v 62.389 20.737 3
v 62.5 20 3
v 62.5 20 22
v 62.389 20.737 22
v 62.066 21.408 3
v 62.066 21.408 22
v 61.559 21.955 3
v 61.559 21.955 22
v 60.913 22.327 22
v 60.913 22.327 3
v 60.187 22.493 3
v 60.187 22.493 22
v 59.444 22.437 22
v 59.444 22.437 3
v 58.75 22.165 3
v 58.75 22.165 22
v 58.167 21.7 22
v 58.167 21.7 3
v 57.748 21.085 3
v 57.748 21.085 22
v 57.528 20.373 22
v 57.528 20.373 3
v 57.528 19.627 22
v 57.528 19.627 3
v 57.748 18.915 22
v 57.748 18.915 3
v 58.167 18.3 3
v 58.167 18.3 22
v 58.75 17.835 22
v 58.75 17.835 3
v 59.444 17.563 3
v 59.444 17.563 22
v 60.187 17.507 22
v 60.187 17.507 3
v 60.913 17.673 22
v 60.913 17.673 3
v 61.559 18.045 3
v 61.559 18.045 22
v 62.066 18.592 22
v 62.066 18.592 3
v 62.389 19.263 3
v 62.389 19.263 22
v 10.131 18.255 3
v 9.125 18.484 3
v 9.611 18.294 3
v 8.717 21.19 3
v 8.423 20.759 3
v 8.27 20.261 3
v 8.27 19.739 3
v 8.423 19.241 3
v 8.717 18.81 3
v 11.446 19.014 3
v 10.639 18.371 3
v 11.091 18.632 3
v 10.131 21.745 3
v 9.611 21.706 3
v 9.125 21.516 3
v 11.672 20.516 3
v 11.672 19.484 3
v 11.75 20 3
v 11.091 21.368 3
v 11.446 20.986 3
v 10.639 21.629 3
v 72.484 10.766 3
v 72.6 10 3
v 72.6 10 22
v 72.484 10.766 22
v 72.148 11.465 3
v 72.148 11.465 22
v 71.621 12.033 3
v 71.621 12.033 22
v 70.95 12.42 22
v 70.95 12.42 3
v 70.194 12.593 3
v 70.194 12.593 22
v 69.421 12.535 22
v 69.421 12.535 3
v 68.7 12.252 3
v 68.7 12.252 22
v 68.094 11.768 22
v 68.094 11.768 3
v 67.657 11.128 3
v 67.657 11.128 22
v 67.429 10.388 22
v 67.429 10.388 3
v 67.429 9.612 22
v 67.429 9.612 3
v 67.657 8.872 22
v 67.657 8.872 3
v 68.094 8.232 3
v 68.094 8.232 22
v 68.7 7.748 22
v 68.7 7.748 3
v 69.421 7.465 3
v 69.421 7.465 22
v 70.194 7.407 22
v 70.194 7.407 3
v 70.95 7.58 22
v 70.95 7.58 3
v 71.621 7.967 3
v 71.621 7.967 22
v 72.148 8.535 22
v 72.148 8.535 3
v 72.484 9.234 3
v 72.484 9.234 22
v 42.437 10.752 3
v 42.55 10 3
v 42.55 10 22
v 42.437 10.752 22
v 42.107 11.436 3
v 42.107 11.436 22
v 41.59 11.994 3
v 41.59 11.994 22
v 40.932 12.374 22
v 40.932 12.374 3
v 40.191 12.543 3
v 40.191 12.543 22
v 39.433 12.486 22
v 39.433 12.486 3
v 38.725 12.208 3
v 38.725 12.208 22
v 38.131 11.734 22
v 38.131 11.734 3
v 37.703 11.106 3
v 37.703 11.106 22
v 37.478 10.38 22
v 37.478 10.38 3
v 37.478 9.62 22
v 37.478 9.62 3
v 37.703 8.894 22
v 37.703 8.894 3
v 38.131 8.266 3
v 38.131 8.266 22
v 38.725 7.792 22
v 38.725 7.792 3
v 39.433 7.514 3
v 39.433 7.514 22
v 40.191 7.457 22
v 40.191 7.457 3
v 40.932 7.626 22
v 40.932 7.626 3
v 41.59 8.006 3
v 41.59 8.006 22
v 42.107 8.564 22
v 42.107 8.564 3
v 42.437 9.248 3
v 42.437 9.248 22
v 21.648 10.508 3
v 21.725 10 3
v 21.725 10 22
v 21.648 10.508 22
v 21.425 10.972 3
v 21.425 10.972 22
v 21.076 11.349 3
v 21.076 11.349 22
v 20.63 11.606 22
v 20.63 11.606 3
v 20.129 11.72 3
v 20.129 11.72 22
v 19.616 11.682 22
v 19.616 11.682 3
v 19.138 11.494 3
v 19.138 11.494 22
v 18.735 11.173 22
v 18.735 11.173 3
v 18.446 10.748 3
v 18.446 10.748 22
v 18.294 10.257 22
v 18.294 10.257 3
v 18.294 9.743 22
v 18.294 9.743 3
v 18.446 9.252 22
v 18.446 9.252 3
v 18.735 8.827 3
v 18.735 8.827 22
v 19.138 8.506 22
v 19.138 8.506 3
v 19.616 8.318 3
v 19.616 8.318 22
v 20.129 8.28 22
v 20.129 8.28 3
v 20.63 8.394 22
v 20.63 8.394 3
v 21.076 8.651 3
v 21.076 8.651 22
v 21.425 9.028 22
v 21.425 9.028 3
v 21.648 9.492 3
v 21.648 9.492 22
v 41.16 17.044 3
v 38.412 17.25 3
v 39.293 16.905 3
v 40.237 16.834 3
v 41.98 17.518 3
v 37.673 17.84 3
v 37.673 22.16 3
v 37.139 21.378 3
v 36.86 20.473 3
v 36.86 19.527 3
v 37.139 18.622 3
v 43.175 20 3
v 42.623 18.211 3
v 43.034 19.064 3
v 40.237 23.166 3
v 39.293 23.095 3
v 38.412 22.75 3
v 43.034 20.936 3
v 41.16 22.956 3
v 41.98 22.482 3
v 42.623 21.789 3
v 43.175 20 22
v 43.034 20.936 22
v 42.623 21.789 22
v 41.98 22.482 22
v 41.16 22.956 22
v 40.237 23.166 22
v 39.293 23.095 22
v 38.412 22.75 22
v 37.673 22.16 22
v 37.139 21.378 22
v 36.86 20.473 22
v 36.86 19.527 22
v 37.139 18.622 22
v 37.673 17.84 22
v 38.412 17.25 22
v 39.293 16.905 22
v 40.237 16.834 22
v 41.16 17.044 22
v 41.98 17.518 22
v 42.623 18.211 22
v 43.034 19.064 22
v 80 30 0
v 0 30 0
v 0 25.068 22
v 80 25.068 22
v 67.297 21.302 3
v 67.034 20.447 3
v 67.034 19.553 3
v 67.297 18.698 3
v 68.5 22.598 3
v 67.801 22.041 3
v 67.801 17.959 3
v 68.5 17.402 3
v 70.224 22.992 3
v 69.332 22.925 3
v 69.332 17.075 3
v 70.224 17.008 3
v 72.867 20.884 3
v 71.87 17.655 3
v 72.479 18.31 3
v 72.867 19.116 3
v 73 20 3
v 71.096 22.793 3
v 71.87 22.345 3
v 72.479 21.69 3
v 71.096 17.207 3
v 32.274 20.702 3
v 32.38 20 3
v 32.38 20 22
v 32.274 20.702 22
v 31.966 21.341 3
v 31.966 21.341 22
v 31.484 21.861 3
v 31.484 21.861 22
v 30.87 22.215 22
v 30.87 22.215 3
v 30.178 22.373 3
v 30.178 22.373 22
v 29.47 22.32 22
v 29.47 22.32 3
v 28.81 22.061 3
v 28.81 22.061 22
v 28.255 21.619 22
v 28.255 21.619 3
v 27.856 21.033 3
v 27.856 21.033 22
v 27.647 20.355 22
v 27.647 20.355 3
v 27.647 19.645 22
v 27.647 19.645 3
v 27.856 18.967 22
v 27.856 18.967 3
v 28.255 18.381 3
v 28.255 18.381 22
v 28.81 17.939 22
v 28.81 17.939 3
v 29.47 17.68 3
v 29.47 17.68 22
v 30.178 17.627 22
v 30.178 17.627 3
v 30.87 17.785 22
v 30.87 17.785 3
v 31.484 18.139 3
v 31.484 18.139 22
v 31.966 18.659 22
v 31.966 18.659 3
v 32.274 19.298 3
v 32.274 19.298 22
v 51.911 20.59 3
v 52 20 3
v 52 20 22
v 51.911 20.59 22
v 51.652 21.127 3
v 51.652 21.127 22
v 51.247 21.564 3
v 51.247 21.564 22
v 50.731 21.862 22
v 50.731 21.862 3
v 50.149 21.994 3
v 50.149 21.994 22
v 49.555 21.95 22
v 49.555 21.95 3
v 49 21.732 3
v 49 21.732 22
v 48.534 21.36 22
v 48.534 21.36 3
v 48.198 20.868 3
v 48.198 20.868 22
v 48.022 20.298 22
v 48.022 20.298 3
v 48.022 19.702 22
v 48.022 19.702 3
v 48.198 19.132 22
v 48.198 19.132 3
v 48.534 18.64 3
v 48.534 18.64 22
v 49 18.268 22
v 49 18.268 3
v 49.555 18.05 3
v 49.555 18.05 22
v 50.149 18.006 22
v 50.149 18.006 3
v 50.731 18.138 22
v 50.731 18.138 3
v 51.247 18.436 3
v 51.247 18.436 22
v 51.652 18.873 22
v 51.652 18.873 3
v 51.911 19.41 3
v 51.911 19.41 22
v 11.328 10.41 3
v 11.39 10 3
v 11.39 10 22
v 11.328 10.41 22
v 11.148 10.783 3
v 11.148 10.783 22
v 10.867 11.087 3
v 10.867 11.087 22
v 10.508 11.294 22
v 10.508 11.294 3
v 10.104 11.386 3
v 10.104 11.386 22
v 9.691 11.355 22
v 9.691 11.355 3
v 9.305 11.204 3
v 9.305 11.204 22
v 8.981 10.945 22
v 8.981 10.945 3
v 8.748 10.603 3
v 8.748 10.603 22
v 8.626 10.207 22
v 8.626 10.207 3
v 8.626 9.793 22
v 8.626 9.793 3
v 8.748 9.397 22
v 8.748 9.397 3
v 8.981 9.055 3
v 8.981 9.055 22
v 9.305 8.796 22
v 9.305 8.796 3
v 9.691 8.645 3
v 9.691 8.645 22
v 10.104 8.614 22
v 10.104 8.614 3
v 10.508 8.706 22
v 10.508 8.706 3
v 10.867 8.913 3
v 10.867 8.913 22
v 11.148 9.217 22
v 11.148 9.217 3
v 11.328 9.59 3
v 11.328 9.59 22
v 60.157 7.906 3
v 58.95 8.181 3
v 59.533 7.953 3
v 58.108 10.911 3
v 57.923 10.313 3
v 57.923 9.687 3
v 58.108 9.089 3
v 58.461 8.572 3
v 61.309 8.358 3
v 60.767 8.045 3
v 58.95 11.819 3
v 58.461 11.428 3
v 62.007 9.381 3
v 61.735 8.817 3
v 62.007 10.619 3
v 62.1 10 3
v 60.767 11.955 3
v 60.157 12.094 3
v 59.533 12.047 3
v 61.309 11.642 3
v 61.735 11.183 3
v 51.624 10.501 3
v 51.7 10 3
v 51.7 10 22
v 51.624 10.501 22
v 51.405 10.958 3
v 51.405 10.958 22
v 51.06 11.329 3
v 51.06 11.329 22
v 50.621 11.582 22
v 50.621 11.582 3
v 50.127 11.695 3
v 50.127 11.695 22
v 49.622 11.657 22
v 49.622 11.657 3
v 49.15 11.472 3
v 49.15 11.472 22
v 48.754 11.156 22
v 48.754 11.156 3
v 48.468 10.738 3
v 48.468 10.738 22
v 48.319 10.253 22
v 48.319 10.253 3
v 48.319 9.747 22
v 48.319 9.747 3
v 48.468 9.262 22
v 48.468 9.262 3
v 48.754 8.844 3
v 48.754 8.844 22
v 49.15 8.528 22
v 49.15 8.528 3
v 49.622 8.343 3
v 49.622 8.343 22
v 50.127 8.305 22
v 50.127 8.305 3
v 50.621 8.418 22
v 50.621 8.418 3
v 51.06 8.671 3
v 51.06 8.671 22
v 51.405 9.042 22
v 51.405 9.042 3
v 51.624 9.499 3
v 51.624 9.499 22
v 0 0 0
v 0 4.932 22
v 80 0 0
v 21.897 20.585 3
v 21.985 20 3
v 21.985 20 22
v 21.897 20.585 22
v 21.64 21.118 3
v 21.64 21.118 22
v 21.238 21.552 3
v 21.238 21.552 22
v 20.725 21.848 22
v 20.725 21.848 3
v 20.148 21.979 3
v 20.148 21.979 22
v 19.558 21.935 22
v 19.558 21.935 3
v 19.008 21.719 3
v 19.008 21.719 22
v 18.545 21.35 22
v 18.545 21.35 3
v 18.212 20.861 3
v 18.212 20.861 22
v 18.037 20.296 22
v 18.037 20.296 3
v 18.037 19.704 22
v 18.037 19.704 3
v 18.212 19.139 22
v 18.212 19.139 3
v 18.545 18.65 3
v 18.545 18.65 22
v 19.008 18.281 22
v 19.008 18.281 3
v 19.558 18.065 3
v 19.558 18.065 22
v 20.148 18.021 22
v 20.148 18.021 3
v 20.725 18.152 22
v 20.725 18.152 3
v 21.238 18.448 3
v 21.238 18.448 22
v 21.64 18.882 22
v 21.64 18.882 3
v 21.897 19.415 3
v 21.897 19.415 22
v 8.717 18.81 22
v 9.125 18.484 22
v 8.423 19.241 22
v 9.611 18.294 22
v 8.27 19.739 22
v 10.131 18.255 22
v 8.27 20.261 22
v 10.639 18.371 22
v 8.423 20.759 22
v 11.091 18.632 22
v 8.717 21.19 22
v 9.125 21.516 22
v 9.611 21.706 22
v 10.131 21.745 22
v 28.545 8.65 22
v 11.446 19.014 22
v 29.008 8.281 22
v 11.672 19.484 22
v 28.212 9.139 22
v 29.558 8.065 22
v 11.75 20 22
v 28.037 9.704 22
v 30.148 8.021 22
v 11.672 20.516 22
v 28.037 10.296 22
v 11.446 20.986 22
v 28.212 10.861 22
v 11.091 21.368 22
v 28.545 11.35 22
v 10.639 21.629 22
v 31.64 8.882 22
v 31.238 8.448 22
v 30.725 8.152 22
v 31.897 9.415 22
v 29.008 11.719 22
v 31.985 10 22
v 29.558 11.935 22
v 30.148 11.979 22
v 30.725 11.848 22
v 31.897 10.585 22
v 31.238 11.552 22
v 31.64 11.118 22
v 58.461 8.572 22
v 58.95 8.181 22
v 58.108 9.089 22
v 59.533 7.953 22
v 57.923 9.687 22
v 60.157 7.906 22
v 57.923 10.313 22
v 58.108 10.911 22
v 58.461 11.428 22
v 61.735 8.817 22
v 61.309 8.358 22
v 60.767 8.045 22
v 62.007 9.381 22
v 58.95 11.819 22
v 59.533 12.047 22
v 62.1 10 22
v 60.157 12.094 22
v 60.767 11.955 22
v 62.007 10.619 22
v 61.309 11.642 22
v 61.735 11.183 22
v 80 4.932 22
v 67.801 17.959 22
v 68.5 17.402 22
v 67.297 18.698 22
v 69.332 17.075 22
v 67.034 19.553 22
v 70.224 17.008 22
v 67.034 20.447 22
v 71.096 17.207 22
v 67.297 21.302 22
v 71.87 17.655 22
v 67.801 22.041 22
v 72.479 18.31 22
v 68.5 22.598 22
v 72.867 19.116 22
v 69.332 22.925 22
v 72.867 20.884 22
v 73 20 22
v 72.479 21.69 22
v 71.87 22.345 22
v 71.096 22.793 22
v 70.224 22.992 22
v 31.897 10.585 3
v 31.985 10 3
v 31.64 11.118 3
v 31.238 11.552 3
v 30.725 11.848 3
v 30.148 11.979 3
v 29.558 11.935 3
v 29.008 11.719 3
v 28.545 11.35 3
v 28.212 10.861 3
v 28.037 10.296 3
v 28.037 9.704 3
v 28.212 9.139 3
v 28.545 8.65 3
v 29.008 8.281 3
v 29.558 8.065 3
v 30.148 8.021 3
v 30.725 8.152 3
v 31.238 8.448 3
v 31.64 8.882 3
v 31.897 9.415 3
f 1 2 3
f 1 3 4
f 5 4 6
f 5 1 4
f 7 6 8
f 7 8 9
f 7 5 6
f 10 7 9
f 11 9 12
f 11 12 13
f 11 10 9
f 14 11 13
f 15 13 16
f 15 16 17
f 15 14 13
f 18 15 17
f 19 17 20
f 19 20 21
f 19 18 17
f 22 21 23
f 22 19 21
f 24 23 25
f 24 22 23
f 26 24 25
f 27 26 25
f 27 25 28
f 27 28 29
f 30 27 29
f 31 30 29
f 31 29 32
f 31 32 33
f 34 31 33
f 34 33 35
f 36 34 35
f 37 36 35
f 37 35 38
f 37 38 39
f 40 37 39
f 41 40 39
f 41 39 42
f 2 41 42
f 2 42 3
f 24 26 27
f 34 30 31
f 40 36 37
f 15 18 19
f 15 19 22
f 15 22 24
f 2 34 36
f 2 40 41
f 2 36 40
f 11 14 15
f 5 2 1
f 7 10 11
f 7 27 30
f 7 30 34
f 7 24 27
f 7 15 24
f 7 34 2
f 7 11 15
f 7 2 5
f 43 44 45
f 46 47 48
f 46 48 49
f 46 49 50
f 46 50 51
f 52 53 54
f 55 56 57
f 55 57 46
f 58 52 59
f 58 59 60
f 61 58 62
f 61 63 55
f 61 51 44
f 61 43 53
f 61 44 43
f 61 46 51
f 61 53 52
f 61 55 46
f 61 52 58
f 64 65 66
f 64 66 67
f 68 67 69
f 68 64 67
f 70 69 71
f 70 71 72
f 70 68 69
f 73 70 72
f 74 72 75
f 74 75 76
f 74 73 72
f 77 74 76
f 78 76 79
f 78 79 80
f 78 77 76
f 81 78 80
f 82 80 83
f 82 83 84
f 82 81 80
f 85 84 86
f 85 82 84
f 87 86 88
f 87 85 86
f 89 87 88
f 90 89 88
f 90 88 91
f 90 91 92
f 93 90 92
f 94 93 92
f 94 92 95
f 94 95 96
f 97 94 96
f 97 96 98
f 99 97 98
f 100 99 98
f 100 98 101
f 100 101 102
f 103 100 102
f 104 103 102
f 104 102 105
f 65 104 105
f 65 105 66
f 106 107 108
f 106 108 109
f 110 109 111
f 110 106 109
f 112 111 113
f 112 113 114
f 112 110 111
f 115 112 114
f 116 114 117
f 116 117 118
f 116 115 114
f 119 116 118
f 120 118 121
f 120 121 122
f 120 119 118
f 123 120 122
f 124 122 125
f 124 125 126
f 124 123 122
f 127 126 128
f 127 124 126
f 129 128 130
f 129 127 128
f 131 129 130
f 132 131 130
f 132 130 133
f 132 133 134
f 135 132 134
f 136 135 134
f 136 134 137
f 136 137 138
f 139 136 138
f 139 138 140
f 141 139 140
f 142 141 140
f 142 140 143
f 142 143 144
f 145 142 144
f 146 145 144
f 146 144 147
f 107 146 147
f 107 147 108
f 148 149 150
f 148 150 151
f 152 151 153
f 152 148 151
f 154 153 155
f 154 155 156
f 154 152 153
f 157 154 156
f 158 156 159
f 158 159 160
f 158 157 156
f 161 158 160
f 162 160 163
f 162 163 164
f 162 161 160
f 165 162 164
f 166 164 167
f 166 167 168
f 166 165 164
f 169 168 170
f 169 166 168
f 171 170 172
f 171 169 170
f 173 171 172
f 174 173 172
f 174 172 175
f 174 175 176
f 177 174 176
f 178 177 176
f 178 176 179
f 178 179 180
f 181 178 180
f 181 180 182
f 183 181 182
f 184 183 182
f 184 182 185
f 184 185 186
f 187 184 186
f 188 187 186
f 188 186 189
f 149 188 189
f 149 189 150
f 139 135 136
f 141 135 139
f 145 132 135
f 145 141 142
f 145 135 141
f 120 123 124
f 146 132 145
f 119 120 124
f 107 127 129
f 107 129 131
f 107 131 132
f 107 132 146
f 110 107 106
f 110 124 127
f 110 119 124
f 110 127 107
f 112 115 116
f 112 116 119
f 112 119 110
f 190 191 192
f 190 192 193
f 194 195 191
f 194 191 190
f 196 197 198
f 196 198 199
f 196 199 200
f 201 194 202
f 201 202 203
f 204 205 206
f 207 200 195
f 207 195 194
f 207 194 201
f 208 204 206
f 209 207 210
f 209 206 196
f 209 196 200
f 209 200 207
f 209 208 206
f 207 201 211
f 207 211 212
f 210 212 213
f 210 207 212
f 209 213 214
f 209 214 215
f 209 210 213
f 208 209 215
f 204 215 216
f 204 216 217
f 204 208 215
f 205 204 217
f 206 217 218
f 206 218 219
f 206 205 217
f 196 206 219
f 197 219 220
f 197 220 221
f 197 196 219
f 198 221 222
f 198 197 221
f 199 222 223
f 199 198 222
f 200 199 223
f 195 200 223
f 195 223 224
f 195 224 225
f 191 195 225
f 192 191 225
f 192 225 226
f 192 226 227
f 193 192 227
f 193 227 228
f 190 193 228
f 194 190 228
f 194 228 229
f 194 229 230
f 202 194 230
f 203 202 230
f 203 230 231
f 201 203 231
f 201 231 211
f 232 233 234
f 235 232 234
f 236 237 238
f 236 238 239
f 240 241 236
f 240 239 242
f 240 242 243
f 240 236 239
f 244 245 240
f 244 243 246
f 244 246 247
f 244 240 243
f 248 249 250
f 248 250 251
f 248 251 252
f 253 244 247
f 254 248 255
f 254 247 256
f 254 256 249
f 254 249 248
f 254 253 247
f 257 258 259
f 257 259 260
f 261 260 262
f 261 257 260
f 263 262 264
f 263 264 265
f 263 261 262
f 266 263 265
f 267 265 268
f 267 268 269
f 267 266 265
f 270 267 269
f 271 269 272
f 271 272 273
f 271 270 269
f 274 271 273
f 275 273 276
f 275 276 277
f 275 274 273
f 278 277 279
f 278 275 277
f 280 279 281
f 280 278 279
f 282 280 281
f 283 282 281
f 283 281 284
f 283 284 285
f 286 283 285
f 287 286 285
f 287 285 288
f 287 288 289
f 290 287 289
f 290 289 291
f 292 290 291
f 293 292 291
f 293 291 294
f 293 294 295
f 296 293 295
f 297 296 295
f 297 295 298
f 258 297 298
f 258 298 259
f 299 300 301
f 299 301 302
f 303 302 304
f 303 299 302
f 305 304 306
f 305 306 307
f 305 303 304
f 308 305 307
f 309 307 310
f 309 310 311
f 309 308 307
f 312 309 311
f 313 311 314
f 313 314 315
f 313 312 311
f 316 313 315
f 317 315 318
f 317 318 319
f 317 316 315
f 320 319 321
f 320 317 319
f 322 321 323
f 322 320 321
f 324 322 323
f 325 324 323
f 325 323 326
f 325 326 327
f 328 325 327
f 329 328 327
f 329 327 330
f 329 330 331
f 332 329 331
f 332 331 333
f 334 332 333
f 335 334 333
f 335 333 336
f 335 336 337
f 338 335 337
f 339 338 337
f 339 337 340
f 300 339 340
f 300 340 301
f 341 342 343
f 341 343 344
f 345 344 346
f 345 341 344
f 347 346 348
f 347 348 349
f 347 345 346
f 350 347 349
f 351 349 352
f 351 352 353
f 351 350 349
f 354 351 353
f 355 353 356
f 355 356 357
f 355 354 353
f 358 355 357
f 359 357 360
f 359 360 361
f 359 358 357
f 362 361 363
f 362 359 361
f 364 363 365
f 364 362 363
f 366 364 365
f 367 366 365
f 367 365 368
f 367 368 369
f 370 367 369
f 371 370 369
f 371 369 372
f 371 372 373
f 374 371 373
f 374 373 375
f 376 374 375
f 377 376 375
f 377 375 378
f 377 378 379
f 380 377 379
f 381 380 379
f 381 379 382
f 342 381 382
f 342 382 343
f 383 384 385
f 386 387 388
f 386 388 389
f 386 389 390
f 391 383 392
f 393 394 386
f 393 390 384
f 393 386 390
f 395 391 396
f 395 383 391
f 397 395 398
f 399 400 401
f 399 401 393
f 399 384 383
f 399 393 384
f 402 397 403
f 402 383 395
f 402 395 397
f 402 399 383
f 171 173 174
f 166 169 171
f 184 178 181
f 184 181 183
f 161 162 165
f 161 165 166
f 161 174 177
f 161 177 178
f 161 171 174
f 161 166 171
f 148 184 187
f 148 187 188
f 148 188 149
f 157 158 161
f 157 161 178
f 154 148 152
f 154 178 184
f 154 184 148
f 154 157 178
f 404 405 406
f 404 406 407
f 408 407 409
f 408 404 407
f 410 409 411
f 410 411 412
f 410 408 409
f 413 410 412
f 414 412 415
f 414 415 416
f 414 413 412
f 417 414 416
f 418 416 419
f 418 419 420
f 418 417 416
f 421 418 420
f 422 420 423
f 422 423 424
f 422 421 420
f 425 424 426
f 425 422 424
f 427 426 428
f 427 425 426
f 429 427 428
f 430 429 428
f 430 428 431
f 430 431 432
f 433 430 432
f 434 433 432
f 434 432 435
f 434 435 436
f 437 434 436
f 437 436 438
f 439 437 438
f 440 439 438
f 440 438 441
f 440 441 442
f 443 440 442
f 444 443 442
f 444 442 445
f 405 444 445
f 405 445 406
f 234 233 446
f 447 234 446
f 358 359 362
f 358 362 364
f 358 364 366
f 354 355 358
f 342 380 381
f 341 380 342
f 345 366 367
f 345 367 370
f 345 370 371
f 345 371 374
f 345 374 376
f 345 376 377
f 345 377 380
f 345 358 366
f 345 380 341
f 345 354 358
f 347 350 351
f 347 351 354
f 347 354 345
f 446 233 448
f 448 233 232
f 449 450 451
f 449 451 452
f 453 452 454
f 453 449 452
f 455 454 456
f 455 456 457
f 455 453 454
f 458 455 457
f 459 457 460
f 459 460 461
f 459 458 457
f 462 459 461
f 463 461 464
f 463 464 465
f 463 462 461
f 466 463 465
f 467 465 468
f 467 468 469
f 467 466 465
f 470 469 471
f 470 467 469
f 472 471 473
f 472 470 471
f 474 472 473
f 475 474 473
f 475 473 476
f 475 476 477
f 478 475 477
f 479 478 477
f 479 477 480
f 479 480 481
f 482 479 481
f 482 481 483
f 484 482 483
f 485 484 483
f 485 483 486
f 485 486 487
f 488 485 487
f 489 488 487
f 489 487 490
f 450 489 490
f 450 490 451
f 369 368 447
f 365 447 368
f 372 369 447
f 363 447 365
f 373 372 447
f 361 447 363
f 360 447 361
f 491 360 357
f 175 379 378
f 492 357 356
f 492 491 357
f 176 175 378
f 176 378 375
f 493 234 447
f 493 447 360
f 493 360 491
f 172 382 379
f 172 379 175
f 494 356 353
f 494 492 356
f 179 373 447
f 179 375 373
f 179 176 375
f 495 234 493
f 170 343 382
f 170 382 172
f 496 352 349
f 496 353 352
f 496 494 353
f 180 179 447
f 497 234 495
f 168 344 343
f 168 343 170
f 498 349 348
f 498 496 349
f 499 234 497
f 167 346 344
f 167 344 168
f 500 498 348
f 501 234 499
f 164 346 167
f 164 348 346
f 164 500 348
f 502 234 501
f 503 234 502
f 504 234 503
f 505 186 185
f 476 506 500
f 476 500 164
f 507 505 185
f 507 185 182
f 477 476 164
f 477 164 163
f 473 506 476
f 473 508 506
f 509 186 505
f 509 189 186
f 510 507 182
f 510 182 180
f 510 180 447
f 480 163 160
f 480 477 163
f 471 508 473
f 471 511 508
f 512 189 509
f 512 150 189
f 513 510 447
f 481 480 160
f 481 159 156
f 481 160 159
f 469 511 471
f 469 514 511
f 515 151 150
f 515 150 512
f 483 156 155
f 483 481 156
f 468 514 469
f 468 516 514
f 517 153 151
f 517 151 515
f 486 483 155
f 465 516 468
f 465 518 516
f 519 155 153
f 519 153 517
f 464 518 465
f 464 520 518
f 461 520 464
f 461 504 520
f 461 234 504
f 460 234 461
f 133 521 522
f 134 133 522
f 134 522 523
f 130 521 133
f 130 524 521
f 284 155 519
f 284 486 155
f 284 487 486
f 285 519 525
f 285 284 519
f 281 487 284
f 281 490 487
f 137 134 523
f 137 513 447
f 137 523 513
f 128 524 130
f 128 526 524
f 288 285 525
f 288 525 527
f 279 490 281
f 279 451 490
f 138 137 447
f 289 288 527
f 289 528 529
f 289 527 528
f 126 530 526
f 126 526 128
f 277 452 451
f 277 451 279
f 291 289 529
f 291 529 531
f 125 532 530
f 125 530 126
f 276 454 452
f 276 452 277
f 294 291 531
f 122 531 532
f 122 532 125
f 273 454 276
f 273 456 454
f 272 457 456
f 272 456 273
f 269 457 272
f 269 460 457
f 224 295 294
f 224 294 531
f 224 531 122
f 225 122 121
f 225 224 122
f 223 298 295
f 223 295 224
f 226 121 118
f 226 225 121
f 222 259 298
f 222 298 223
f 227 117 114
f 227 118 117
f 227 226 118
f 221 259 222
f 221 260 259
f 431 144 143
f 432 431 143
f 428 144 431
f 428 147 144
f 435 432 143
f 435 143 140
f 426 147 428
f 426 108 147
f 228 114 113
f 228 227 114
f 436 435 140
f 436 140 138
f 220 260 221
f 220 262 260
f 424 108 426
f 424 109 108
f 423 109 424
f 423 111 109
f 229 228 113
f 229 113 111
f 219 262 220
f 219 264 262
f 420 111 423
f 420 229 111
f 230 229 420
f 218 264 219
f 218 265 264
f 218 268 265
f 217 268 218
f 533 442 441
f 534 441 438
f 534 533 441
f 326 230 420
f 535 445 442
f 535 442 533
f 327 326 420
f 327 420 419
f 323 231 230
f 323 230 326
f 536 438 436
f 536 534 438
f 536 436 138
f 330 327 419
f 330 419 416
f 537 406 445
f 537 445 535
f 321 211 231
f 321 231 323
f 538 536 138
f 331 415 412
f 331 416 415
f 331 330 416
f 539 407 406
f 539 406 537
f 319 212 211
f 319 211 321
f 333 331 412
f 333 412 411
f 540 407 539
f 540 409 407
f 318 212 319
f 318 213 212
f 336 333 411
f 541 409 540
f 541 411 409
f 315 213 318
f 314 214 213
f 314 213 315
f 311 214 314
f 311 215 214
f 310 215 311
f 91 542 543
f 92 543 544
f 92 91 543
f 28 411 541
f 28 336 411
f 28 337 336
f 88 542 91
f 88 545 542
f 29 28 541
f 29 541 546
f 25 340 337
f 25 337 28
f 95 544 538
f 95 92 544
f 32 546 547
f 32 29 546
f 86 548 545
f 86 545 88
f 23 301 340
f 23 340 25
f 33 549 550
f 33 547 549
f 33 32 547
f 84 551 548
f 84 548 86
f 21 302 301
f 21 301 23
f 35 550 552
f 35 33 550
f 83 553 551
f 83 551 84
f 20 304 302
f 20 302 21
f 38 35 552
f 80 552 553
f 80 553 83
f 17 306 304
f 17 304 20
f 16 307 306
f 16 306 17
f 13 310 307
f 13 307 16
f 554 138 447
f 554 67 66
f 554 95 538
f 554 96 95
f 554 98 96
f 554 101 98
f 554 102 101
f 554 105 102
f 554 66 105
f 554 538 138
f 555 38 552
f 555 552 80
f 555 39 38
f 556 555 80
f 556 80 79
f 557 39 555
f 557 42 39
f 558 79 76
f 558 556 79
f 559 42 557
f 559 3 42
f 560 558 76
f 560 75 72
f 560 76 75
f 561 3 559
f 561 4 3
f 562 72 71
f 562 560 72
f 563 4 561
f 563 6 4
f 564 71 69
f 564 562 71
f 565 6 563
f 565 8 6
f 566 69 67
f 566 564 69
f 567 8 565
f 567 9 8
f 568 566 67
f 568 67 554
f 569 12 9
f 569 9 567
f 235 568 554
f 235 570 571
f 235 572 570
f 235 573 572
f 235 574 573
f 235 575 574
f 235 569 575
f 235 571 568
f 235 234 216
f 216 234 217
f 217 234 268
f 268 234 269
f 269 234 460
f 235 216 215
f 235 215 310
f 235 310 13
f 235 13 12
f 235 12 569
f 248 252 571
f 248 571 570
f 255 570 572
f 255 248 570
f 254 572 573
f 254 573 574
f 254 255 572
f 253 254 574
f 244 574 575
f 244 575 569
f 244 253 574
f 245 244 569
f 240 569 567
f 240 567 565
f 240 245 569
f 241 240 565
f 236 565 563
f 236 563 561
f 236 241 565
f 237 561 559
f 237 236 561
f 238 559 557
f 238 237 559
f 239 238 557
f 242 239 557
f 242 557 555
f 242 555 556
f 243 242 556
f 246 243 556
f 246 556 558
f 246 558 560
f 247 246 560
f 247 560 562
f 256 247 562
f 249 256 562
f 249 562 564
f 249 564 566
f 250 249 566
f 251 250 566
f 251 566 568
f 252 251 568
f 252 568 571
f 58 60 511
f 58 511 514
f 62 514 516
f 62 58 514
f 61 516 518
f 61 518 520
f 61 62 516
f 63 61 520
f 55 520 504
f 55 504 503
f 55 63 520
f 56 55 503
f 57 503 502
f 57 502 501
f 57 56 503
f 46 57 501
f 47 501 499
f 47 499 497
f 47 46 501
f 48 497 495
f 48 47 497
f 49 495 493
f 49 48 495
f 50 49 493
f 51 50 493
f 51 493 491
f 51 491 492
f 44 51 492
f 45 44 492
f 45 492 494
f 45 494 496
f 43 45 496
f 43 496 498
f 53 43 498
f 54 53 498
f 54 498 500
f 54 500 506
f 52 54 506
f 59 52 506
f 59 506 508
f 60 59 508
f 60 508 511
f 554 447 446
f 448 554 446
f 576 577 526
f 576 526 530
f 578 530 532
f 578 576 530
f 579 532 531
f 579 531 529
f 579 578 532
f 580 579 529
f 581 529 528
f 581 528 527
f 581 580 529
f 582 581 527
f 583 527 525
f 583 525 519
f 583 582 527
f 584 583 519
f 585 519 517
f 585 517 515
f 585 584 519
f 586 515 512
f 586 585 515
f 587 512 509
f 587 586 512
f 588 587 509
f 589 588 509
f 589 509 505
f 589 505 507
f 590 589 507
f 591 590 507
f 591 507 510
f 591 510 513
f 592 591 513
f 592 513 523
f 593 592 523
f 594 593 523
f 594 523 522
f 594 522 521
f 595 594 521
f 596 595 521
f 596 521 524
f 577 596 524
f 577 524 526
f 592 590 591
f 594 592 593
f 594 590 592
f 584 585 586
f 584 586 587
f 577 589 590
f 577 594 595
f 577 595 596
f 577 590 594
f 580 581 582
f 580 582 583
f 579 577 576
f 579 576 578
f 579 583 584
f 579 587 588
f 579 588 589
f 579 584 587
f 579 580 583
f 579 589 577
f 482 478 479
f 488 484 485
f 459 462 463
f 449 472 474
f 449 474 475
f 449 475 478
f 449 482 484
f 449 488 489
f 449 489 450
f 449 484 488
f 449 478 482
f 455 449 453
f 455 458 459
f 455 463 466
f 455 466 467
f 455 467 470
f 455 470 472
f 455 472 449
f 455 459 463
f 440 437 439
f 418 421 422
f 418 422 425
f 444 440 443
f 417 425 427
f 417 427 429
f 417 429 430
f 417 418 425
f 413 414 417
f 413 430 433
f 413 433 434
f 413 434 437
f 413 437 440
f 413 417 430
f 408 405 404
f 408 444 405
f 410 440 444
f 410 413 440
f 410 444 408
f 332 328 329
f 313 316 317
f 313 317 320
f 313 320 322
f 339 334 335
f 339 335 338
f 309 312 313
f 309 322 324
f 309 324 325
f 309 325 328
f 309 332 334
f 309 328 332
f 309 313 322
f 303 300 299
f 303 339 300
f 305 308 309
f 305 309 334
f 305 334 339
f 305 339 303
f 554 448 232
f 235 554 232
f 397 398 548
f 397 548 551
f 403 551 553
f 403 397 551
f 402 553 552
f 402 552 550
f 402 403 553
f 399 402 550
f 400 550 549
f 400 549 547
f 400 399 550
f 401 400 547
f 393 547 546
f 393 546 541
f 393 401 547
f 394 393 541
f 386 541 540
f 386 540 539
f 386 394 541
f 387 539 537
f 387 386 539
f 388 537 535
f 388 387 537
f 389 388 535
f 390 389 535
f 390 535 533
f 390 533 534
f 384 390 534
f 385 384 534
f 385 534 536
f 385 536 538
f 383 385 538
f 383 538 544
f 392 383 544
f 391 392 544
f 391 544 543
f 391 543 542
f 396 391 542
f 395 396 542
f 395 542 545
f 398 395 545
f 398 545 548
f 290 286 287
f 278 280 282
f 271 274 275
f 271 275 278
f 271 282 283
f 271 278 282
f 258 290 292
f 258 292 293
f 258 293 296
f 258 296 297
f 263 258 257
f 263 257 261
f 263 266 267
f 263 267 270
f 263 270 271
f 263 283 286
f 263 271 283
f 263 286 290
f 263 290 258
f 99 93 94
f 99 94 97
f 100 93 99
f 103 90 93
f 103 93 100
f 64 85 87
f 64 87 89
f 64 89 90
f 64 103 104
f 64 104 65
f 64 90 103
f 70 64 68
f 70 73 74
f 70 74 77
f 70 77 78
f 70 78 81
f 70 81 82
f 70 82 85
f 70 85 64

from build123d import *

# Parameters (mm, degrees)
F0_R     = 1.39
F0_R_2   = 1.725
F0_R_3   = 1.985
F0_R_4   = 2.55
F0_R_5   = 1.7
F0_R_6   = 2.1
F0_R_7   = 2.6
F0_R_8   = 1.75
F0_R_9   = 2.38
F0_R_10  = 3.175
F0_R_11  = 2
F0_R_12  = 2.5
F0_R_13  = 3
F1_DEPTH = 22
F2_DEPTH = 3
F4_DEPTH = 300


with BuildPart() as f1:
    # F0 (on Top) → F1 (new body)
    with BuildSketch(Plane.XY):
        Polygon((0, 30), (0, 0), (10, 0), (20, 0), (30, 0), (40, 0), (50, 0), (60, 0), (70, 0), (80, 0), (80, 30), align=None)
        with Locations((10, 10)):
            Circle(F0_R, mode=Mode.SUBTRACT)
        with Locations((20, 10)):
            Circle(F0_R_2, mode=Mode.SUBTRACT)
        with Locations((30, 10)):
            Circle(F0_R_3, mode=Mode.SUBTRACT)
        with Locations((40, 10)):
            Circle(F0_R_4, mode=Mode.SUBTRACT)
        with Locations((50, 10)):
            Circle(F0_R_5, mode=Mode.SUBTRACT)
        with Locations((60, 10)):
            Circle(F0_R_6, mode=Mode.SUBTRACT)
        with Locations((70, 10)):
            Circle(F0_R_7, mode=Mode.SUBTRACT)
        with Locations((10, 20)):
            Circle(F0_R_8, mode=Mode.SUBTRACT)
        with Locations((20, 20)):
            Circle(F0_R_3, mode=Mode.SUBTRACT)
        with Locations((30, 20)):
            Circle(F0_R_9, mode=Mode.SUBTRACT)
        with Locations((40, 20)):
            Circle(F0_R_10, mode=Mode.SUBTRACT)
        with Locations((50, 20)):
            Circle(F0_R_11, mode=Mode.SUBTRACT)
        with Locations((60, 20)):
            Circle(F0_R_12, mode=Mode.SUBTRACT)
        with Locations((70, 20)):
            Circle(F0_R_13, mode=Mode.SUBTRACT)
    extrude(amount=F1_DEPTH)

    # F0 (on Top) → F2 (join)
    with BuildSketch(Plane.XY):
        with Locations((70, 20)):
            Circle(F0_R_13)
        with Locations((70, 10)):
            Circle(F0_R_7)
        with Locations((60, 10)):
            Circle(F0_R_6)
        with Locations((60, 20)):
            Circle(F0_R_12)
        with Locations((50, 20)):
            Circle(F0_R_11)
        with Locations((50, 10)):
            Circle(F0_R_5)
        with Locations((40, 20)):
            Circle(F0_R_10)
        with Locations((40, 10)):
            Circle(F0_R_4)
        with Locations((30, 10)):
            Circle(F0_R_3)
        with Locations((30, 20)):
            Circle(F0_R_9)
        with Locations((20, 20)):
            Circle(F0_R_3)
        with Locations((20, 10)):
            Circle(F0_R_2)
        with Locations((10, 20)):
            Circle(F0_R_8)
        with Locations((10, 10)):
            Circle(F0_R)
    extrude(amount=F2_DEPTH)

    # F3 (on face) → F4 (cut)
    with BuildSketch(Plane(origin=(0, 0, 0), x_dir=(0, -1, 0), z_dir=(-1, 0, 0))):
        Polygon((-30, 22), (-30, 0), (-25.067758, 22), align=None)
        Polygon((-4.932242, 22), (0, 0), (0, 22), align=None)
    extrude(amount=-F4_DEPTH, mode=Mode.SUBTRACT)


solid = f1.part
